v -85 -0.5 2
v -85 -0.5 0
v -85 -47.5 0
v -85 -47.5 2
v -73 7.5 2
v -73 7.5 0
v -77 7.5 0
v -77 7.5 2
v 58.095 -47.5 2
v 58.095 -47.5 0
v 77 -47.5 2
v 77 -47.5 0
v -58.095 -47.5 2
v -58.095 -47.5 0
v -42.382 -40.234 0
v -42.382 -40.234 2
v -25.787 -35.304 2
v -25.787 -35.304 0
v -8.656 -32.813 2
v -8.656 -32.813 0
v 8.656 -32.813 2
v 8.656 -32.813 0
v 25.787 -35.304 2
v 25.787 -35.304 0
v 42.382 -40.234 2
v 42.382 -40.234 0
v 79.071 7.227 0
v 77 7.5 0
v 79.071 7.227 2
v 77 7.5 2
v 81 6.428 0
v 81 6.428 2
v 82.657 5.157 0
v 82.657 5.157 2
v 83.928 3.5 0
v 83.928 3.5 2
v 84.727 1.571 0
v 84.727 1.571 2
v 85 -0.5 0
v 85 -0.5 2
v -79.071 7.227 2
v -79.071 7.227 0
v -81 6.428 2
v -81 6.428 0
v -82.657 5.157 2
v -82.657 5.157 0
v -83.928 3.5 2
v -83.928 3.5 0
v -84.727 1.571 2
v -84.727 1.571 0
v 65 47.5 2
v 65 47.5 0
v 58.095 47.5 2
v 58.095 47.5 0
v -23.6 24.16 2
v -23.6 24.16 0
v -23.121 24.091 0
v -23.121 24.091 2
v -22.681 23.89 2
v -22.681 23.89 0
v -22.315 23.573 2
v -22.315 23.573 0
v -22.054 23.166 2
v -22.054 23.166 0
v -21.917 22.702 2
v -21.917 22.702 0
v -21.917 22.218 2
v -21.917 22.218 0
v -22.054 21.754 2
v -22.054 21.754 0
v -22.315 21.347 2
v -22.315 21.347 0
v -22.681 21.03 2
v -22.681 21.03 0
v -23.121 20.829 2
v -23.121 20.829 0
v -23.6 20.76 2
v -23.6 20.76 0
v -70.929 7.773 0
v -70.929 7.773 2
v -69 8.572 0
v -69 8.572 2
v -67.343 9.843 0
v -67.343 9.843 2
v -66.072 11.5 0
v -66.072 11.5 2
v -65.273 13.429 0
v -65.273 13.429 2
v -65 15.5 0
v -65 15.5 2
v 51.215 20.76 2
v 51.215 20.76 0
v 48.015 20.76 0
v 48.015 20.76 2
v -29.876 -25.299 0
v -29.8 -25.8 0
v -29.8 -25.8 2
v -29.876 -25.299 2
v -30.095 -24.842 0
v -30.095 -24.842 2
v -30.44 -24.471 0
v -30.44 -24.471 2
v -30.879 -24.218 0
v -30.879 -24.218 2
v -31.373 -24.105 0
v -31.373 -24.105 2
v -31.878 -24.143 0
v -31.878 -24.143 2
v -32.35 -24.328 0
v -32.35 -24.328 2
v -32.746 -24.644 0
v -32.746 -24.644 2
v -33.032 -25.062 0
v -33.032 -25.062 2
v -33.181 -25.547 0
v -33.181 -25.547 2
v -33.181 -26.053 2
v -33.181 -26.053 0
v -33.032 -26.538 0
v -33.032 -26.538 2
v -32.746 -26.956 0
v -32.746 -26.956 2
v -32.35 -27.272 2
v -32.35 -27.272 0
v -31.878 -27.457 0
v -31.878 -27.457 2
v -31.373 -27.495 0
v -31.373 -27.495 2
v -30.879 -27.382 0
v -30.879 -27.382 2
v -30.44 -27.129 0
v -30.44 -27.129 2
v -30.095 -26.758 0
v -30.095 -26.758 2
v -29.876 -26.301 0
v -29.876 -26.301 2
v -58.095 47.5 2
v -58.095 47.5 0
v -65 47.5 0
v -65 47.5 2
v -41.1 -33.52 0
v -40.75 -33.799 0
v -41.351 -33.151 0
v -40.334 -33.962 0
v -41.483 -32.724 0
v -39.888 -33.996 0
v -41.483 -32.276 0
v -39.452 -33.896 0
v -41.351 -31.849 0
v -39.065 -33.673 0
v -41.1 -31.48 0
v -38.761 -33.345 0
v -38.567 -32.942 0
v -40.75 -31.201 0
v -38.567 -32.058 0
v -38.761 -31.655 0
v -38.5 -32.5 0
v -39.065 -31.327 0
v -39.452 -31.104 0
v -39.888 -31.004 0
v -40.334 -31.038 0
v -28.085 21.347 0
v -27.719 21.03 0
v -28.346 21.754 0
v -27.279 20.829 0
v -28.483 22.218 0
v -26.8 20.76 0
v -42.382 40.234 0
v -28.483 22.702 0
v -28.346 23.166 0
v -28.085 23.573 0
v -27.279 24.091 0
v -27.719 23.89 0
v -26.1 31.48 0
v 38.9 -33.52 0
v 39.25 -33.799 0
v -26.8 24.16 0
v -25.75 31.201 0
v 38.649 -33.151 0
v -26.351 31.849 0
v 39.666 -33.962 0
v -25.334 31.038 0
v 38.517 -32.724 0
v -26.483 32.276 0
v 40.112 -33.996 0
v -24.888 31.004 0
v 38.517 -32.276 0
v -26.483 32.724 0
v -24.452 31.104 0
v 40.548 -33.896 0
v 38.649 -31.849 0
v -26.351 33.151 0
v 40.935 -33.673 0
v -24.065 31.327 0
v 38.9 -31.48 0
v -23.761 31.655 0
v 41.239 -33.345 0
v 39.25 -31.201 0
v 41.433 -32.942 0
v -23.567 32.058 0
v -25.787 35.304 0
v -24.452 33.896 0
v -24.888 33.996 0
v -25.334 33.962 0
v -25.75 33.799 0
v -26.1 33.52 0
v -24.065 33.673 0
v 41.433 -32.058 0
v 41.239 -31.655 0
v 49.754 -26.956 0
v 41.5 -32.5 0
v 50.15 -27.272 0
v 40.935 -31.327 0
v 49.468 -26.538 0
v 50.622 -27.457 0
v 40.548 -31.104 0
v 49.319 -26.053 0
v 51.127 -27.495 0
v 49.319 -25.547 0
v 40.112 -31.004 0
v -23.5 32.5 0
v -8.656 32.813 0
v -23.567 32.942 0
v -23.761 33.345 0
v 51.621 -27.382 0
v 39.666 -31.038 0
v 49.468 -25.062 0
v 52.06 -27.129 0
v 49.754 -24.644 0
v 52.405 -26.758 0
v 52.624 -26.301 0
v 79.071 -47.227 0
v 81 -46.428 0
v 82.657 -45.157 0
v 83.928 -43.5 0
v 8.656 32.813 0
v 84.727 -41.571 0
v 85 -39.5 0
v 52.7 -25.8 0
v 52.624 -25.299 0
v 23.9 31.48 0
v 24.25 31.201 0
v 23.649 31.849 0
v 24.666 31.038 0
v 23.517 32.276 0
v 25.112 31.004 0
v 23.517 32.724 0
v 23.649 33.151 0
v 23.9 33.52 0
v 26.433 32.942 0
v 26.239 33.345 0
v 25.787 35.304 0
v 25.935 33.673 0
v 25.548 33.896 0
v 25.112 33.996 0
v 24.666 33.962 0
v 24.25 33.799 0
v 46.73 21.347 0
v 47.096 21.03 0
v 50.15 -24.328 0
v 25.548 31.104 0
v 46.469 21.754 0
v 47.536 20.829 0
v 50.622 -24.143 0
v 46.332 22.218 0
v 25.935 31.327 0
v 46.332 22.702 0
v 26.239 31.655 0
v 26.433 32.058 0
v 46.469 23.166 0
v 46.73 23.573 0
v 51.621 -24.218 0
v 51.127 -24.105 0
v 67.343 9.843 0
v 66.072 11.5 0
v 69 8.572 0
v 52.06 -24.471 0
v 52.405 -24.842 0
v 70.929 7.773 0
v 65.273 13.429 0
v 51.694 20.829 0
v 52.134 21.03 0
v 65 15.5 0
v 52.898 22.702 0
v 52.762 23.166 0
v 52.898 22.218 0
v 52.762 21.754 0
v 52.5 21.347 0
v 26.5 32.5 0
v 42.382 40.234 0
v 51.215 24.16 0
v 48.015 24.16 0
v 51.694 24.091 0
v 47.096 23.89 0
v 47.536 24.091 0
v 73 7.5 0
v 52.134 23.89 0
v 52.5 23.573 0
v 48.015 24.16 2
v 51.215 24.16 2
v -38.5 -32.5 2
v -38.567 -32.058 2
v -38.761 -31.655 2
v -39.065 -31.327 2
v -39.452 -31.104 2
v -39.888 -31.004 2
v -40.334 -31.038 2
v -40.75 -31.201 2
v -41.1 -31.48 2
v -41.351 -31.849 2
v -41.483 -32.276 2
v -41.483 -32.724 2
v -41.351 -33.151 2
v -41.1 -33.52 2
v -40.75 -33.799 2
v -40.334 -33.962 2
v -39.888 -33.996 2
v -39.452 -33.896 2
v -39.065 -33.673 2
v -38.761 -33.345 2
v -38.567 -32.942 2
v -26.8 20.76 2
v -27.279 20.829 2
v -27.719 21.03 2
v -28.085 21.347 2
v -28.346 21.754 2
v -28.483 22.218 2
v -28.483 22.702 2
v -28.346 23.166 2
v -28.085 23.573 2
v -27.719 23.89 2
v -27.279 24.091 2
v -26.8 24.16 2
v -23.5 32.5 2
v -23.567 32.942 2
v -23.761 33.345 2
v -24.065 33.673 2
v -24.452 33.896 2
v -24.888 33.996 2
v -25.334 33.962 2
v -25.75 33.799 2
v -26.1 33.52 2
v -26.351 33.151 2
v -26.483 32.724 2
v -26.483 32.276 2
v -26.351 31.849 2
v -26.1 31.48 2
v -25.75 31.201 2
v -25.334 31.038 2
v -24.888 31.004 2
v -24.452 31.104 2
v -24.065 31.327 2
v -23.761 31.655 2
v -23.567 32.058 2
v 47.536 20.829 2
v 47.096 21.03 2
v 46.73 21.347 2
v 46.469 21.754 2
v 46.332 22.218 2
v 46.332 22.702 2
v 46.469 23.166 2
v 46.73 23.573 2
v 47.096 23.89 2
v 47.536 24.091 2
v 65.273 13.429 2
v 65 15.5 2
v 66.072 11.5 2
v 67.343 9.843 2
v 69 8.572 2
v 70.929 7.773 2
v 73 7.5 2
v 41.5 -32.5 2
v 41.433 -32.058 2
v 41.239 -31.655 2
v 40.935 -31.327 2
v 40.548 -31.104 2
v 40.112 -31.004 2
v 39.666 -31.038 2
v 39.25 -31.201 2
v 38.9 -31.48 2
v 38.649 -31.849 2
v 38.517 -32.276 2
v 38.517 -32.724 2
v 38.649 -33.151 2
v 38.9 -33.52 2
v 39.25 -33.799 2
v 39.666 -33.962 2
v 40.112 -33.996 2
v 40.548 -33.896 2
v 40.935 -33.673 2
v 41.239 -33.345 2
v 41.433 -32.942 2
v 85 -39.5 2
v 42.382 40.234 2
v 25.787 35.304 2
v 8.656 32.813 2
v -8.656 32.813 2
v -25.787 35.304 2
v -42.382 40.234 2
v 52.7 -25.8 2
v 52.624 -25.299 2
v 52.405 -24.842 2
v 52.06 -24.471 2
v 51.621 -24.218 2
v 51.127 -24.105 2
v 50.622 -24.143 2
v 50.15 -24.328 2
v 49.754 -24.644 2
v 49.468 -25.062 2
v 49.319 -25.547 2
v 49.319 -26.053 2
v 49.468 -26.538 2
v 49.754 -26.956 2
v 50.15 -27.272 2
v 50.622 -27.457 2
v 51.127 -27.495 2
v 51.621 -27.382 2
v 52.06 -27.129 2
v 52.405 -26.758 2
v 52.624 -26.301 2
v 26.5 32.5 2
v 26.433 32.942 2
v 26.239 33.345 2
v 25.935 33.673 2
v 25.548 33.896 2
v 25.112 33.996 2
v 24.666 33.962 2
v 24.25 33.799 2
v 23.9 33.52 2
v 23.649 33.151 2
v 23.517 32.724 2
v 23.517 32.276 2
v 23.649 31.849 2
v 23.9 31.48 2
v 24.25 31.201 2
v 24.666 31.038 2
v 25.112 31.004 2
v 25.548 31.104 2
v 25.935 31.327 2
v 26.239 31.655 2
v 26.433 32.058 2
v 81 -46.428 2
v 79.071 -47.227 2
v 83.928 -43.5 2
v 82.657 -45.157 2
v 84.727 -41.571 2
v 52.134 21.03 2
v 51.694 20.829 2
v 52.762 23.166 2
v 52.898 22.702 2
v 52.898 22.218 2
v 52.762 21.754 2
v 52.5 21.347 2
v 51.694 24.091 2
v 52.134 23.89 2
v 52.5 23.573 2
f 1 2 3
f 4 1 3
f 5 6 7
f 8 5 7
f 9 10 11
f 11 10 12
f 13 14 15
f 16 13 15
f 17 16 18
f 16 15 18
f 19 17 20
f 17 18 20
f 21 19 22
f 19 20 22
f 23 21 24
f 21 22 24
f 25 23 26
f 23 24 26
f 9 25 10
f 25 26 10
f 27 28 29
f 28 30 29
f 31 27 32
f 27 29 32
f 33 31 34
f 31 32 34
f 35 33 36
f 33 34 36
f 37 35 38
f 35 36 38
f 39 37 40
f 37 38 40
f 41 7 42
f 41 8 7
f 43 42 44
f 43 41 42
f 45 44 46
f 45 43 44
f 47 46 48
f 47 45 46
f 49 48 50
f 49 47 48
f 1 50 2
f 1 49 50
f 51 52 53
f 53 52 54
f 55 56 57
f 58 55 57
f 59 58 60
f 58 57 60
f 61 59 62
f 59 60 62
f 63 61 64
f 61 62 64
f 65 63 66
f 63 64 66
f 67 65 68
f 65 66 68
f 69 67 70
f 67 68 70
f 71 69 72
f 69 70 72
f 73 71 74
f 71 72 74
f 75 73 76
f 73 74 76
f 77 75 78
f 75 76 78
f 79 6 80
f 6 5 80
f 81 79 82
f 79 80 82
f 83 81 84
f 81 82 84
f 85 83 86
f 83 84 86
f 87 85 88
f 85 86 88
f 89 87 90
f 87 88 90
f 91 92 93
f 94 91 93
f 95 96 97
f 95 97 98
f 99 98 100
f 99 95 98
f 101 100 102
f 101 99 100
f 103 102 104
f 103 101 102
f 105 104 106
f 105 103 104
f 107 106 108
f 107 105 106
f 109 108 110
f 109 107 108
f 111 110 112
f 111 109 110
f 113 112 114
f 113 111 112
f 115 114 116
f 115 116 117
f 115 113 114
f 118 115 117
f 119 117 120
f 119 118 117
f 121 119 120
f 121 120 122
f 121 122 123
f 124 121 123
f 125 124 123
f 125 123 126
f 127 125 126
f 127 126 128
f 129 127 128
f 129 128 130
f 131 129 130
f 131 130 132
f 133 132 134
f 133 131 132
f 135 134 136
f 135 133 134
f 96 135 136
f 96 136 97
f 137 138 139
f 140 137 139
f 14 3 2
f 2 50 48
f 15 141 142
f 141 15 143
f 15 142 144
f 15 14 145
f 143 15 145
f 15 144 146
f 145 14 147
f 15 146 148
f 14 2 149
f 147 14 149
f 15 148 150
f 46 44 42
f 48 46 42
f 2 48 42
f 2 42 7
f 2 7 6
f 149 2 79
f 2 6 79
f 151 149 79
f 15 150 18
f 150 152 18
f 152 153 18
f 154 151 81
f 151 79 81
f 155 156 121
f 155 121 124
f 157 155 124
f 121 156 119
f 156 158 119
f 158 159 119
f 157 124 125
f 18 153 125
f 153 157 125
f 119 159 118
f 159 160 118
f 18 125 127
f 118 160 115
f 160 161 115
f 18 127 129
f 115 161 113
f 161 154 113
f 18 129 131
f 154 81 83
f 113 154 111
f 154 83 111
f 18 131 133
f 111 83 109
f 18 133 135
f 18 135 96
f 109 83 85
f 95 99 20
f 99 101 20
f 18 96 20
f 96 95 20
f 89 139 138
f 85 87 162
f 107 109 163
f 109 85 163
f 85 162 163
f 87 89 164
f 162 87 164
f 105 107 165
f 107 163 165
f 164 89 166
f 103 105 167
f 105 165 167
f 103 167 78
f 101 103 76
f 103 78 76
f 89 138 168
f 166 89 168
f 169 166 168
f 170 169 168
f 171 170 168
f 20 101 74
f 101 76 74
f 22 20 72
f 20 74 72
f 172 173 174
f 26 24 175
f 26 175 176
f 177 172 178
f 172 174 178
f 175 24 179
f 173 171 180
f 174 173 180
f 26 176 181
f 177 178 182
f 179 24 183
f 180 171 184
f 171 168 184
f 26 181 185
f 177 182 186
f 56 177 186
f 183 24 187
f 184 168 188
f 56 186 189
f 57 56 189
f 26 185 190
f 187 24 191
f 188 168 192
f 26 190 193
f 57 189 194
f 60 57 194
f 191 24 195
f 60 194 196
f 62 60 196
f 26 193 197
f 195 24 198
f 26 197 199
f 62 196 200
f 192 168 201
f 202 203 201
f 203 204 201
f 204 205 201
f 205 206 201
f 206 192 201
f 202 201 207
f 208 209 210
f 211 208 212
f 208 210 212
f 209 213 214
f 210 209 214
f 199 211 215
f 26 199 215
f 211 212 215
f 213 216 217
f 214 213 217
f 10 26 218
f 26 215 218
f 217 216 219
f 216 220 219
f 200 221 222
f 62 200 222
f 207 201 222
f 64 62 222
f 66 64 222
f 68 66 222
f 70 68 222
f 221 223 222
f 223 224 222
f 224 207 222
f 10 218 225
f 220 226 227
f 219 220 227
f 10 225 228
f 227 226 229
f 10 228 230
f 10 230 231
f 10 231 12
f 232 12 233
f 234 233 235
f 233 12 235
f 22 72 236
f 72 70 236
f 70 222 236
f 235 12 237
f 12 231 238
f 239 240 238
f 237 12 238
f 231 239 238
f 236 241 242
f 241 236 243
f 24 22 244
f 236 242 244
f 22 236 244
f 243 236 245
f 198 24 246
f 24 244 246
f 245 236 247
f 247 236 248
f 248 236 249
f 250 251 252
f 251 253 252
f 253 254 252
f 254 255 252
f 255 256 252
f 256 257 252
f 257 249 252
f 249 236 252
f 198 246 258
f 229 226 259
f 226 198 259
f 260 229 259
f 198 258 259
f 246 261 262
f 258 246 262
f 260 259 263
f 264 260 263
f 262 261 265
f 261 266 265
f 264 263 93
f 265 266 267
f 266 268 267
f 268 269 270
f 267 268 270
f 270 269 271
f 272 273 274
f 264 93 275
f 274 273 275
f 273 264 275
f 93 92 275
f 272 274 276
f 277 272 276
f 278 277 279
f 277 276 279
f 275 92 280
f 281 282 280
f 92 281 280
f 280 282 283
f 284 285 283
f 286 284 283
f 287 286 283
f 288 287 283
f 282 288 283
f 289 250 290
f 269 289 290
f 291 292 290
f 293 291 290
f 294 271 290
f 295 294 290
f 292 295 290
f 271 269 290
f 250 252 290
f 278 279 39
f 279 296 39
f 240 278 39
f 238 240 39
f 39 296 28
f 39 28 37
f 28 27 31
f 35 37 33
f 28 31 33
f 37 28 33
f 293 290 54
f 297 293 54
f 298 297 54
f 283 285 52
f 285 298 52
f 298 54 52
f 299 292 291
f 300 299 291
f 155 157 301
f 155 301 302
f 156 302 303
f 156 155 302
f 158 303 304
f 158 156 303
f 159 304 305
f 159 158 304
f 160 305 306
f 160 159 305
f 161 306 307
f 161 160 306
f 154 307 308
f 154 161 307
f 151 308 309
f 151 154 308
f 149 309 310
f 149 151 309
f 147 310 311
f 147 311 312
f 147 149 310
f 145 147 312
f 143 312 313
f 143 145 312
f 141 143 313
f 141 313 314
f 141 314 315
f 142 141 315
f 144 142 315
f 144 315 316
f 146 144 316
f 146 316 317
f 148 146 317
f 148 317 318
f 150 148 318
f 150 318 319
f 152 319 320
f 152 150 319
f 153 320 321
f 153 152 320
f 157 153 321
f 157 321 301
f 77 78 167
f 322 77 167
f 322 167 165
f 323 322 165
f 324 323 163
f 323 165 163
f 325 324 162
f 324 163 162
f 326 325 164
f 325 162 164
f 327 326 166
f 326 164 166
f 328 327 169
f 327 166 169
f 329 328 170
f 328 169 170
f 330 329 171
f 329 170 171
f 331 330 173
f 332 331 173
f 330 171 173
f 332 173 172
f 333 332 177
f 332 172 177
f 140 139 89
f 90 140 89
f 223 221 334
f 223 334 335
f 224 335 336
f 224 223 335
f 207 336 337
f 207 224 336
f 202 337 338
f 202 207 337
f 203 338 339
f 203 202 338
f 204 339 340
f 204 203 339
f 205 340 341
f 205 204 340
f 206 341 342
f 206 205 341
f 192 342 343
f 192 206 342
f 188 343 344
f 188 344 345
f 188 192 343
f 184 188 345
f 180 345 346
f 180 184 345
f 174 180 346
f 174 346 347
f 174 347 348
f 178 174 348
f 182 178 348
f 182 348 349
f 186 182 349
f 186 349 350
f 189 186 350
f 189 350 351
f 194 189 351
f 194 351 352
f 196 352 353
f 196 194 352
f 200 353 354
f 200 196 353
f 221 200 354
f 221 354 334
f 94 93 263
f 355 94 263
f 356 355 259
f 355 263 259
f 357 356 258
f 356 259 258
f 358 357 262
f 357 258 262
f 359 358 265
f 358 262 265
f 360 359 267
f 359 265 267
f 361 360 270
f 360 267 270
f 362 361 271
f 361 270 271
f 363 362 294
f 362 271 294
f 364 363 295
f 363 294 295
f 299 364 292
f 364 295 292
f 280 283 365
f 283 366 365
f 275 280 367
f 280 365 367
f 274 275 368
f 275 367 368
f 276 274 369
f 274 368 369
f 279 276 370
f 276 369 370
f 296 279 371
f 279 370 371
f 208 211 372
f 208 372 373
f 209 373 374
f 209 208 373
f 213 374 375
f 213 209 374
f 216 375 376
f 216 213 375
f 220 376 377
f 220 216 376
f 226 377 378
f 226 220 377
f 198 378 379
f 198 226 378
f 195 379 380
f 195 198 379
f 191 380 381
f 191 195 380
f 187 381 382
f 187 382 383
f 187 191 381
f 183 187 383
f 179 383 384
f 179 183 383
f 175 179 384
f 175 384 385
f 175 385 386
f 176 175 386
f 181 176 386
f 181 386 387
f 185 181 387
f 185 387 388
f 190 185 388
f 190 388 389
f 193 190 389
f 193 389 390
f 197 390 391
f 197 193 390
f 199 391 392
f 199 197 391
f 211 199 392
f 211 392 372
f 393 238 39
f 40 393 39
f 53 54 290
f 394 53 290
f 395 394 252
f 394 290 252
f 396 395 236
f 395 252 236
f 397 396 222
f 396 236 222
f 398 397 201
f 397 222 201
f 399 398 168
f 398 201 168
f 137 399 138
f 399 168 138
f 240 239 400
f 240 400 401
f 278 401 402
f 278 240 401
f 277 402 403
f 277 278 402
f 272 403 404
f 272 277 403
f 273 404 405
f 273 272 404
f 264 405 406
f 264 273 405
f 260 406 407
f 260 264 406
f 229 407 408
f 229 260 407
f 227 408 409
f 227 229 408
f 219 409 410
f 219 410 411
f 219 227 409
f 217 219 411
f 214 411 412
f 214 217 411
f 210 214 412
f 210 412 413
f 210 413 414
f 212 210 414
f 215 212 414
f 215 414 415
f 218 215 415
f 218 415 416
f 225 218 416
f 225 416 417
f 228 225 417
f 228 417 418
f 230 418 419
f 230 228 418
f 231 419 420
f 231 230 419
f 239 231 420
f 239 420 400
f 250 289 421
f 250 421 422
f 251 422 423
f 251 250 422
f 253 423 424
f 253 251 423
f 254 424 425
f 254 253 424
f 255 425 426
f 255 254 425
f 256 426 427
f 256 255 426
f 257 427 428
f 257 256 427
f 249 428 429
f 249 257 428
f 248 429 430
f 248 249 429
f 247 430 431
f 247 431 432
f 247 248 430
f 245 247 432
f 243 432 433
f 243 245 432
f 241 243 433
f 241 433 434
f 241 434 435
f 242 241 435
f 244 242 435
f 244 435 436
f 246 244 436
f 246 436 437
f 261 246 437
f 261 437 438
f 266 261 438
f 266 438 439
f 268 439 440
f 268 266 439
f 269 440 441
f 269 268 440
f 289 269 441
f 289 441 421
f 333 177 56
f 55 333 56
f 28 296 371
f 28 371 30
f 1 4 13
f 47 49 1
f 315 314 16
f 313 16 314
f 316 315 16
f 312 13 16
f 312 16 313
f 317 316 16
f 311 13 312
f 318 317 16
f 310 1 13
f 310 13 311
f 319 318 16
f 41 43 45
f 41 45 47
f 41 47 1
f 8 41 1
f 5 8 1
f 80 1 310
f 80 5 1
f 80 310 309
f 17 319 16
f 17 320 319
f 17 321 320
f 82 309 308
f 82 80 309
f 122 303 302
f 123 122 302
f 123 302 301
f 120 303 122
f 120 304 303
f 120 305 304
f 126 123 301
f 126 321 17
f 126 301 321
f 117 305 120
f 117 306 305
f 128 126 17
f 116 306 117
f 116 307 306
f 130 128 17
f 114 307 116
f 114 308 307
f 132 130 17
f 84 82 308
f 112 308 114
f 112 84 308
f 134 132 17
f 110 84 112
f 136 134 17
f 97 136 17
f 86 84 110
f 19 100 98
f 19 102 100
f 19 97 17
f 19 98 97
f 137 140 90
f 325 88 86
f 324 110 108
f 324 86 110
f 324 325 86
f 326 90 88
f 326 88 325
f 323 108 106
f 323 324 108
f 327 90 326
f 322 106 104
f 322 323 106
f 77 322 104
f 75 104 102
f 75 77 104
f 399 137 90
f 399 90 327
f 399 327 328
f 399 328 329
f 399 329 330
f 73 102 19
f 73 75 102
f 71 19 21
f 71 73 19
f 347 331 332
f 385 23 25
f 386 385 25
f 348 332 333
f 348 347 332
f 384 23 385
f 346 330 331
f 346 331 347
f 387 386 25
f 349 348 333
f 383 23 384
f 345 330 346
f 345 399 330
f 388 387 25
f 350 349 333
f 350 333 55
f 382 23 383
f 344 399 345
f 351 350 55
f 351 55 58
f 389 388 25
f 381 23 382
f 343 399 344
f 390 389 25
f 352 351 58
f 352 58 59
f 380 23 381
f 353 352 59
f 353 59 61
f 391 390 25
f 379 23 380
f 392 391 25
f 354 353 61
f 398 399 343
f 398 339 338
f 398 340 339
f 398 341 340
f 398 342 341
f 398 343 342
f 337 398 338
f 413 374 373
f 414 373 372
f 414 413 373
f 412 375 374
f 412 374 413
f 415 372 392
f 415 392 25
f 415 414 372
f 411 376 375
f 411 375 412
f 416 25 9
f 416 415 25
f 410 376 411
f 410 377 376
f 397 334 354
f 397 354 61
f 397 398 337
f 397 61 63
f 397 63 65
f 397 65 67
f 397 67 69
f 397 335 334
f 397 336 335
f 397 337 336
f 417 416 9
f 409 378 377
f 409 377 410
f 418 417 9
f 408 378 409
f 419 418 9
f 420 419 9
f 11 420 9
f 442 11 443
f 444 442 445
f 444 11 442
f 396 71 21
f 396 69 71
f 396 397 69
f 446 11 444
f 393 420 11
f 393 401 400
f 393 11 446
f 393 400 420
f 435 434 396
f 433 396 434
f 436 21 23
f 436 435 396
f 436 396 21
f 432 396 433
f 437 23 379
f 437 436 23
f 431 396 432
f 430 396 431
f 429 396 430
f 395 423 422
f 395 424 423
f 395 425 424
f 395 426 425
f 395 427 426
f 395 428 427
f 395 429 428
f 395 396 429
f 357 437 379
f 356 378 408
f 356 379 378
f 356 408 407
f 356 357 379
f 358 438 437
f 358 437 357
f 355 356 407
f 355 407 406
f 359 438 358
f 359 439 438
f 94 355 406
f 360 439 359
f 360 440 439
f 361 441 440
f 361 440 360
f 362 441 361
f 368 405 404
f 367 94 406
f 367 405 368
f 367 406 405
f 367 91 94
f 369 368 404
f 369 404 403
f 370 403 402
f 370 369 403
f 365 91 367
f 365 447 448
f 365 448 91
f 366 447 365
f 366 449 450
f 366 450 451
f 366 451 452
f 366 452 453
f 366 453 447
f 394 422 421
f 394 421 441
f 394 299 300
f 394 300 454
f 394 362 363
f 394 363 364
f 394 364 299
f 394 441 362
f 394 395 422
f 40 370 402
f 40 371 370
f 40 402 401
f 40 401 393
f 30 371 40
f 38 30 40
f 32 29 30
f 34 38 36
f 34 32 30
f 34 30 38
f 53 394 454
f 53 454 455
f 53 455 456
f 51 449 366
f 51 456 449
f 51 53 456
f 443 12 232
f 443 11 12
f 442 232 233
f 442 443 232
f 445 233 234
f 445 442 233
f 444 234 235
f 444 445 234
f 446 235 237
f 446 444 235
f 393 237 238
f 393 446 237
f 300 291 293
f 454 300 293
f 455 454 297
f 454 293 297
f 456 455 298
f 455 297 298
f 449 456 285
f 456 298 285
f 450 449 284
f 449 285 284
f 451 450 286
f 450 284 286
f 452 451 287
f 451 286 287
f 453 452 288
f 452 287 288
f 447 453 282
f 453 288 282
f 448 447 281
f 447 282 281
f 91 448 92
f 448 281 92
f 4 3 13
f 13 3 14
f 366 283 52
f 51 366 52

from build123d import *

# Parameters (mm, degrees)
SKETCH2_R           = 1.5
SKETCH2_R_2         = 1.7
BOSS_EXTRUDE1_DEPTH = 2
FILLET4_R           = 8
SKETCH2_3_W         = 20
SKETCH2_3_H         = 55
BOSS_EXTRUDE2_DEPTH = 2
FILLET6_R           = 8
FILLET7_R           = 8


with BuildPart() as part:
    # Sketch2 → Boss-Extrude1 (new body)
    with BuildSketch(Plane.XY):
        with BuildLine():
            Line((65, 7.5), (65, 47.5))
            Line((65, 47.5), (58.094750193, 47.5))
            ThreePointArc((58.094750193, 47.5), (0, 32.5), (-58.094750193, 47.5))
            Line((-58.094750193, 47.5), (-65, 47.5))
            Line((-65, 47.5), (-65, 7.5))
            Line((-65, 7.5), (-85, 7.5))
            Line((-85, 7.5), (-85, -47.5))
            Line((-85, -47.5), (-58.094750193, -47.5))
            ThreePointArc((-58.094750193, -47.5), (0, -32.5), (58.094750193, -47.5))
            Line((58.094750193, -47.5), (65, -47.5))
            Line((65, -47.5), (65, 7.5))
        make_face()
        with Locations((-40, -32.5)):
            Circle(SKETCH2_R, mode=Mode.SUBTRACT)
        with Locations((-31.5, -25.8)):
            Circle(SKETCH2_R_2, mode=Mode.SUBTRACT)
        with Locations((40, -32.5)):
            Circle(SKETCH2_R, mode=Mode.SUBTRACT)
        with Locations((51, -25.8)):
            Circle(SKETCH2_R_2, mode=Mode.SUBTRACT)
        with BuildLine():
            ThreePointArc((-26.8, 20.76), (-28.5, 22.46), (-26.8, 24.16))
            Line((-26.8, 24.16), (-23.6, 24.16))
            ThreePointArc((-23.6, 24.16), (-21.9, 22.46), (-23.6, 20.76))
            Line((-23.6, 20.76), (-26.8, 20.76))
        make_face(mode=Mode.SUBTRACT)
        with Locations((-25, 32.5)):
            Circle(SKETCH2_R, mode=Mode.SUBTRACT)
        with BuildLine():
            ThreePointArc((48.015152789, 20.76), (46.315152789, 22.46), (48.015152789, 24.16))
            Line((48.015152789, 24.16), (51.215152789, 24.16))
            ThreePointArc((51.215152789, 24.16), (52.915152789, 22.46), (51.215152789, 20.76))
            Line((51.215152789, 20.76), (48.015152789, 20.76))
        make_face(mode=Mode.SUBTRACT)
        with Locations((25, 32.5)):
            Circle(SKETCH2_R, mode=Mode.SUBTRACT)
    extrude(amount=BOSS_EXTRUDE1_DEPTH)

    # Fillet4
    fillet4_edges = [part.edges().sort_by_distance(p)[0] for p in [
        (-85, 7.5, 1),
    ]]
    fillet(fillet4_edges, radius=FILLET4_R)

    # Sketch2<3> → Boss-Extrude2 (add)
    with BuildSketch(Plane.XY):
        with Locations((75, -20)):
            Rectangle(SKETCH2_3_W, SKETCH2_3_H)
    extrude(amount=BOSS_EXTRUDE2_DEPTH)

    # Fillet6
    fillet6_edges = [part.edges().sort_by_distance(p)[0] for p in [
        (85, -47.5, 1),
        (85, 7.5, 1),
        (65, 7.5, 1),
    ]]
    fillet(fillet6_edges, radius=FILLET6_R)

    # Fillet7
    fillet7_edges = [part.edges().sort_by_distance(p)[0] for p in [
        (-65, 7.5, 1),
    ]]
    fillet(fillet7_edges, radius=FILLET7_R)


solid = part.part
